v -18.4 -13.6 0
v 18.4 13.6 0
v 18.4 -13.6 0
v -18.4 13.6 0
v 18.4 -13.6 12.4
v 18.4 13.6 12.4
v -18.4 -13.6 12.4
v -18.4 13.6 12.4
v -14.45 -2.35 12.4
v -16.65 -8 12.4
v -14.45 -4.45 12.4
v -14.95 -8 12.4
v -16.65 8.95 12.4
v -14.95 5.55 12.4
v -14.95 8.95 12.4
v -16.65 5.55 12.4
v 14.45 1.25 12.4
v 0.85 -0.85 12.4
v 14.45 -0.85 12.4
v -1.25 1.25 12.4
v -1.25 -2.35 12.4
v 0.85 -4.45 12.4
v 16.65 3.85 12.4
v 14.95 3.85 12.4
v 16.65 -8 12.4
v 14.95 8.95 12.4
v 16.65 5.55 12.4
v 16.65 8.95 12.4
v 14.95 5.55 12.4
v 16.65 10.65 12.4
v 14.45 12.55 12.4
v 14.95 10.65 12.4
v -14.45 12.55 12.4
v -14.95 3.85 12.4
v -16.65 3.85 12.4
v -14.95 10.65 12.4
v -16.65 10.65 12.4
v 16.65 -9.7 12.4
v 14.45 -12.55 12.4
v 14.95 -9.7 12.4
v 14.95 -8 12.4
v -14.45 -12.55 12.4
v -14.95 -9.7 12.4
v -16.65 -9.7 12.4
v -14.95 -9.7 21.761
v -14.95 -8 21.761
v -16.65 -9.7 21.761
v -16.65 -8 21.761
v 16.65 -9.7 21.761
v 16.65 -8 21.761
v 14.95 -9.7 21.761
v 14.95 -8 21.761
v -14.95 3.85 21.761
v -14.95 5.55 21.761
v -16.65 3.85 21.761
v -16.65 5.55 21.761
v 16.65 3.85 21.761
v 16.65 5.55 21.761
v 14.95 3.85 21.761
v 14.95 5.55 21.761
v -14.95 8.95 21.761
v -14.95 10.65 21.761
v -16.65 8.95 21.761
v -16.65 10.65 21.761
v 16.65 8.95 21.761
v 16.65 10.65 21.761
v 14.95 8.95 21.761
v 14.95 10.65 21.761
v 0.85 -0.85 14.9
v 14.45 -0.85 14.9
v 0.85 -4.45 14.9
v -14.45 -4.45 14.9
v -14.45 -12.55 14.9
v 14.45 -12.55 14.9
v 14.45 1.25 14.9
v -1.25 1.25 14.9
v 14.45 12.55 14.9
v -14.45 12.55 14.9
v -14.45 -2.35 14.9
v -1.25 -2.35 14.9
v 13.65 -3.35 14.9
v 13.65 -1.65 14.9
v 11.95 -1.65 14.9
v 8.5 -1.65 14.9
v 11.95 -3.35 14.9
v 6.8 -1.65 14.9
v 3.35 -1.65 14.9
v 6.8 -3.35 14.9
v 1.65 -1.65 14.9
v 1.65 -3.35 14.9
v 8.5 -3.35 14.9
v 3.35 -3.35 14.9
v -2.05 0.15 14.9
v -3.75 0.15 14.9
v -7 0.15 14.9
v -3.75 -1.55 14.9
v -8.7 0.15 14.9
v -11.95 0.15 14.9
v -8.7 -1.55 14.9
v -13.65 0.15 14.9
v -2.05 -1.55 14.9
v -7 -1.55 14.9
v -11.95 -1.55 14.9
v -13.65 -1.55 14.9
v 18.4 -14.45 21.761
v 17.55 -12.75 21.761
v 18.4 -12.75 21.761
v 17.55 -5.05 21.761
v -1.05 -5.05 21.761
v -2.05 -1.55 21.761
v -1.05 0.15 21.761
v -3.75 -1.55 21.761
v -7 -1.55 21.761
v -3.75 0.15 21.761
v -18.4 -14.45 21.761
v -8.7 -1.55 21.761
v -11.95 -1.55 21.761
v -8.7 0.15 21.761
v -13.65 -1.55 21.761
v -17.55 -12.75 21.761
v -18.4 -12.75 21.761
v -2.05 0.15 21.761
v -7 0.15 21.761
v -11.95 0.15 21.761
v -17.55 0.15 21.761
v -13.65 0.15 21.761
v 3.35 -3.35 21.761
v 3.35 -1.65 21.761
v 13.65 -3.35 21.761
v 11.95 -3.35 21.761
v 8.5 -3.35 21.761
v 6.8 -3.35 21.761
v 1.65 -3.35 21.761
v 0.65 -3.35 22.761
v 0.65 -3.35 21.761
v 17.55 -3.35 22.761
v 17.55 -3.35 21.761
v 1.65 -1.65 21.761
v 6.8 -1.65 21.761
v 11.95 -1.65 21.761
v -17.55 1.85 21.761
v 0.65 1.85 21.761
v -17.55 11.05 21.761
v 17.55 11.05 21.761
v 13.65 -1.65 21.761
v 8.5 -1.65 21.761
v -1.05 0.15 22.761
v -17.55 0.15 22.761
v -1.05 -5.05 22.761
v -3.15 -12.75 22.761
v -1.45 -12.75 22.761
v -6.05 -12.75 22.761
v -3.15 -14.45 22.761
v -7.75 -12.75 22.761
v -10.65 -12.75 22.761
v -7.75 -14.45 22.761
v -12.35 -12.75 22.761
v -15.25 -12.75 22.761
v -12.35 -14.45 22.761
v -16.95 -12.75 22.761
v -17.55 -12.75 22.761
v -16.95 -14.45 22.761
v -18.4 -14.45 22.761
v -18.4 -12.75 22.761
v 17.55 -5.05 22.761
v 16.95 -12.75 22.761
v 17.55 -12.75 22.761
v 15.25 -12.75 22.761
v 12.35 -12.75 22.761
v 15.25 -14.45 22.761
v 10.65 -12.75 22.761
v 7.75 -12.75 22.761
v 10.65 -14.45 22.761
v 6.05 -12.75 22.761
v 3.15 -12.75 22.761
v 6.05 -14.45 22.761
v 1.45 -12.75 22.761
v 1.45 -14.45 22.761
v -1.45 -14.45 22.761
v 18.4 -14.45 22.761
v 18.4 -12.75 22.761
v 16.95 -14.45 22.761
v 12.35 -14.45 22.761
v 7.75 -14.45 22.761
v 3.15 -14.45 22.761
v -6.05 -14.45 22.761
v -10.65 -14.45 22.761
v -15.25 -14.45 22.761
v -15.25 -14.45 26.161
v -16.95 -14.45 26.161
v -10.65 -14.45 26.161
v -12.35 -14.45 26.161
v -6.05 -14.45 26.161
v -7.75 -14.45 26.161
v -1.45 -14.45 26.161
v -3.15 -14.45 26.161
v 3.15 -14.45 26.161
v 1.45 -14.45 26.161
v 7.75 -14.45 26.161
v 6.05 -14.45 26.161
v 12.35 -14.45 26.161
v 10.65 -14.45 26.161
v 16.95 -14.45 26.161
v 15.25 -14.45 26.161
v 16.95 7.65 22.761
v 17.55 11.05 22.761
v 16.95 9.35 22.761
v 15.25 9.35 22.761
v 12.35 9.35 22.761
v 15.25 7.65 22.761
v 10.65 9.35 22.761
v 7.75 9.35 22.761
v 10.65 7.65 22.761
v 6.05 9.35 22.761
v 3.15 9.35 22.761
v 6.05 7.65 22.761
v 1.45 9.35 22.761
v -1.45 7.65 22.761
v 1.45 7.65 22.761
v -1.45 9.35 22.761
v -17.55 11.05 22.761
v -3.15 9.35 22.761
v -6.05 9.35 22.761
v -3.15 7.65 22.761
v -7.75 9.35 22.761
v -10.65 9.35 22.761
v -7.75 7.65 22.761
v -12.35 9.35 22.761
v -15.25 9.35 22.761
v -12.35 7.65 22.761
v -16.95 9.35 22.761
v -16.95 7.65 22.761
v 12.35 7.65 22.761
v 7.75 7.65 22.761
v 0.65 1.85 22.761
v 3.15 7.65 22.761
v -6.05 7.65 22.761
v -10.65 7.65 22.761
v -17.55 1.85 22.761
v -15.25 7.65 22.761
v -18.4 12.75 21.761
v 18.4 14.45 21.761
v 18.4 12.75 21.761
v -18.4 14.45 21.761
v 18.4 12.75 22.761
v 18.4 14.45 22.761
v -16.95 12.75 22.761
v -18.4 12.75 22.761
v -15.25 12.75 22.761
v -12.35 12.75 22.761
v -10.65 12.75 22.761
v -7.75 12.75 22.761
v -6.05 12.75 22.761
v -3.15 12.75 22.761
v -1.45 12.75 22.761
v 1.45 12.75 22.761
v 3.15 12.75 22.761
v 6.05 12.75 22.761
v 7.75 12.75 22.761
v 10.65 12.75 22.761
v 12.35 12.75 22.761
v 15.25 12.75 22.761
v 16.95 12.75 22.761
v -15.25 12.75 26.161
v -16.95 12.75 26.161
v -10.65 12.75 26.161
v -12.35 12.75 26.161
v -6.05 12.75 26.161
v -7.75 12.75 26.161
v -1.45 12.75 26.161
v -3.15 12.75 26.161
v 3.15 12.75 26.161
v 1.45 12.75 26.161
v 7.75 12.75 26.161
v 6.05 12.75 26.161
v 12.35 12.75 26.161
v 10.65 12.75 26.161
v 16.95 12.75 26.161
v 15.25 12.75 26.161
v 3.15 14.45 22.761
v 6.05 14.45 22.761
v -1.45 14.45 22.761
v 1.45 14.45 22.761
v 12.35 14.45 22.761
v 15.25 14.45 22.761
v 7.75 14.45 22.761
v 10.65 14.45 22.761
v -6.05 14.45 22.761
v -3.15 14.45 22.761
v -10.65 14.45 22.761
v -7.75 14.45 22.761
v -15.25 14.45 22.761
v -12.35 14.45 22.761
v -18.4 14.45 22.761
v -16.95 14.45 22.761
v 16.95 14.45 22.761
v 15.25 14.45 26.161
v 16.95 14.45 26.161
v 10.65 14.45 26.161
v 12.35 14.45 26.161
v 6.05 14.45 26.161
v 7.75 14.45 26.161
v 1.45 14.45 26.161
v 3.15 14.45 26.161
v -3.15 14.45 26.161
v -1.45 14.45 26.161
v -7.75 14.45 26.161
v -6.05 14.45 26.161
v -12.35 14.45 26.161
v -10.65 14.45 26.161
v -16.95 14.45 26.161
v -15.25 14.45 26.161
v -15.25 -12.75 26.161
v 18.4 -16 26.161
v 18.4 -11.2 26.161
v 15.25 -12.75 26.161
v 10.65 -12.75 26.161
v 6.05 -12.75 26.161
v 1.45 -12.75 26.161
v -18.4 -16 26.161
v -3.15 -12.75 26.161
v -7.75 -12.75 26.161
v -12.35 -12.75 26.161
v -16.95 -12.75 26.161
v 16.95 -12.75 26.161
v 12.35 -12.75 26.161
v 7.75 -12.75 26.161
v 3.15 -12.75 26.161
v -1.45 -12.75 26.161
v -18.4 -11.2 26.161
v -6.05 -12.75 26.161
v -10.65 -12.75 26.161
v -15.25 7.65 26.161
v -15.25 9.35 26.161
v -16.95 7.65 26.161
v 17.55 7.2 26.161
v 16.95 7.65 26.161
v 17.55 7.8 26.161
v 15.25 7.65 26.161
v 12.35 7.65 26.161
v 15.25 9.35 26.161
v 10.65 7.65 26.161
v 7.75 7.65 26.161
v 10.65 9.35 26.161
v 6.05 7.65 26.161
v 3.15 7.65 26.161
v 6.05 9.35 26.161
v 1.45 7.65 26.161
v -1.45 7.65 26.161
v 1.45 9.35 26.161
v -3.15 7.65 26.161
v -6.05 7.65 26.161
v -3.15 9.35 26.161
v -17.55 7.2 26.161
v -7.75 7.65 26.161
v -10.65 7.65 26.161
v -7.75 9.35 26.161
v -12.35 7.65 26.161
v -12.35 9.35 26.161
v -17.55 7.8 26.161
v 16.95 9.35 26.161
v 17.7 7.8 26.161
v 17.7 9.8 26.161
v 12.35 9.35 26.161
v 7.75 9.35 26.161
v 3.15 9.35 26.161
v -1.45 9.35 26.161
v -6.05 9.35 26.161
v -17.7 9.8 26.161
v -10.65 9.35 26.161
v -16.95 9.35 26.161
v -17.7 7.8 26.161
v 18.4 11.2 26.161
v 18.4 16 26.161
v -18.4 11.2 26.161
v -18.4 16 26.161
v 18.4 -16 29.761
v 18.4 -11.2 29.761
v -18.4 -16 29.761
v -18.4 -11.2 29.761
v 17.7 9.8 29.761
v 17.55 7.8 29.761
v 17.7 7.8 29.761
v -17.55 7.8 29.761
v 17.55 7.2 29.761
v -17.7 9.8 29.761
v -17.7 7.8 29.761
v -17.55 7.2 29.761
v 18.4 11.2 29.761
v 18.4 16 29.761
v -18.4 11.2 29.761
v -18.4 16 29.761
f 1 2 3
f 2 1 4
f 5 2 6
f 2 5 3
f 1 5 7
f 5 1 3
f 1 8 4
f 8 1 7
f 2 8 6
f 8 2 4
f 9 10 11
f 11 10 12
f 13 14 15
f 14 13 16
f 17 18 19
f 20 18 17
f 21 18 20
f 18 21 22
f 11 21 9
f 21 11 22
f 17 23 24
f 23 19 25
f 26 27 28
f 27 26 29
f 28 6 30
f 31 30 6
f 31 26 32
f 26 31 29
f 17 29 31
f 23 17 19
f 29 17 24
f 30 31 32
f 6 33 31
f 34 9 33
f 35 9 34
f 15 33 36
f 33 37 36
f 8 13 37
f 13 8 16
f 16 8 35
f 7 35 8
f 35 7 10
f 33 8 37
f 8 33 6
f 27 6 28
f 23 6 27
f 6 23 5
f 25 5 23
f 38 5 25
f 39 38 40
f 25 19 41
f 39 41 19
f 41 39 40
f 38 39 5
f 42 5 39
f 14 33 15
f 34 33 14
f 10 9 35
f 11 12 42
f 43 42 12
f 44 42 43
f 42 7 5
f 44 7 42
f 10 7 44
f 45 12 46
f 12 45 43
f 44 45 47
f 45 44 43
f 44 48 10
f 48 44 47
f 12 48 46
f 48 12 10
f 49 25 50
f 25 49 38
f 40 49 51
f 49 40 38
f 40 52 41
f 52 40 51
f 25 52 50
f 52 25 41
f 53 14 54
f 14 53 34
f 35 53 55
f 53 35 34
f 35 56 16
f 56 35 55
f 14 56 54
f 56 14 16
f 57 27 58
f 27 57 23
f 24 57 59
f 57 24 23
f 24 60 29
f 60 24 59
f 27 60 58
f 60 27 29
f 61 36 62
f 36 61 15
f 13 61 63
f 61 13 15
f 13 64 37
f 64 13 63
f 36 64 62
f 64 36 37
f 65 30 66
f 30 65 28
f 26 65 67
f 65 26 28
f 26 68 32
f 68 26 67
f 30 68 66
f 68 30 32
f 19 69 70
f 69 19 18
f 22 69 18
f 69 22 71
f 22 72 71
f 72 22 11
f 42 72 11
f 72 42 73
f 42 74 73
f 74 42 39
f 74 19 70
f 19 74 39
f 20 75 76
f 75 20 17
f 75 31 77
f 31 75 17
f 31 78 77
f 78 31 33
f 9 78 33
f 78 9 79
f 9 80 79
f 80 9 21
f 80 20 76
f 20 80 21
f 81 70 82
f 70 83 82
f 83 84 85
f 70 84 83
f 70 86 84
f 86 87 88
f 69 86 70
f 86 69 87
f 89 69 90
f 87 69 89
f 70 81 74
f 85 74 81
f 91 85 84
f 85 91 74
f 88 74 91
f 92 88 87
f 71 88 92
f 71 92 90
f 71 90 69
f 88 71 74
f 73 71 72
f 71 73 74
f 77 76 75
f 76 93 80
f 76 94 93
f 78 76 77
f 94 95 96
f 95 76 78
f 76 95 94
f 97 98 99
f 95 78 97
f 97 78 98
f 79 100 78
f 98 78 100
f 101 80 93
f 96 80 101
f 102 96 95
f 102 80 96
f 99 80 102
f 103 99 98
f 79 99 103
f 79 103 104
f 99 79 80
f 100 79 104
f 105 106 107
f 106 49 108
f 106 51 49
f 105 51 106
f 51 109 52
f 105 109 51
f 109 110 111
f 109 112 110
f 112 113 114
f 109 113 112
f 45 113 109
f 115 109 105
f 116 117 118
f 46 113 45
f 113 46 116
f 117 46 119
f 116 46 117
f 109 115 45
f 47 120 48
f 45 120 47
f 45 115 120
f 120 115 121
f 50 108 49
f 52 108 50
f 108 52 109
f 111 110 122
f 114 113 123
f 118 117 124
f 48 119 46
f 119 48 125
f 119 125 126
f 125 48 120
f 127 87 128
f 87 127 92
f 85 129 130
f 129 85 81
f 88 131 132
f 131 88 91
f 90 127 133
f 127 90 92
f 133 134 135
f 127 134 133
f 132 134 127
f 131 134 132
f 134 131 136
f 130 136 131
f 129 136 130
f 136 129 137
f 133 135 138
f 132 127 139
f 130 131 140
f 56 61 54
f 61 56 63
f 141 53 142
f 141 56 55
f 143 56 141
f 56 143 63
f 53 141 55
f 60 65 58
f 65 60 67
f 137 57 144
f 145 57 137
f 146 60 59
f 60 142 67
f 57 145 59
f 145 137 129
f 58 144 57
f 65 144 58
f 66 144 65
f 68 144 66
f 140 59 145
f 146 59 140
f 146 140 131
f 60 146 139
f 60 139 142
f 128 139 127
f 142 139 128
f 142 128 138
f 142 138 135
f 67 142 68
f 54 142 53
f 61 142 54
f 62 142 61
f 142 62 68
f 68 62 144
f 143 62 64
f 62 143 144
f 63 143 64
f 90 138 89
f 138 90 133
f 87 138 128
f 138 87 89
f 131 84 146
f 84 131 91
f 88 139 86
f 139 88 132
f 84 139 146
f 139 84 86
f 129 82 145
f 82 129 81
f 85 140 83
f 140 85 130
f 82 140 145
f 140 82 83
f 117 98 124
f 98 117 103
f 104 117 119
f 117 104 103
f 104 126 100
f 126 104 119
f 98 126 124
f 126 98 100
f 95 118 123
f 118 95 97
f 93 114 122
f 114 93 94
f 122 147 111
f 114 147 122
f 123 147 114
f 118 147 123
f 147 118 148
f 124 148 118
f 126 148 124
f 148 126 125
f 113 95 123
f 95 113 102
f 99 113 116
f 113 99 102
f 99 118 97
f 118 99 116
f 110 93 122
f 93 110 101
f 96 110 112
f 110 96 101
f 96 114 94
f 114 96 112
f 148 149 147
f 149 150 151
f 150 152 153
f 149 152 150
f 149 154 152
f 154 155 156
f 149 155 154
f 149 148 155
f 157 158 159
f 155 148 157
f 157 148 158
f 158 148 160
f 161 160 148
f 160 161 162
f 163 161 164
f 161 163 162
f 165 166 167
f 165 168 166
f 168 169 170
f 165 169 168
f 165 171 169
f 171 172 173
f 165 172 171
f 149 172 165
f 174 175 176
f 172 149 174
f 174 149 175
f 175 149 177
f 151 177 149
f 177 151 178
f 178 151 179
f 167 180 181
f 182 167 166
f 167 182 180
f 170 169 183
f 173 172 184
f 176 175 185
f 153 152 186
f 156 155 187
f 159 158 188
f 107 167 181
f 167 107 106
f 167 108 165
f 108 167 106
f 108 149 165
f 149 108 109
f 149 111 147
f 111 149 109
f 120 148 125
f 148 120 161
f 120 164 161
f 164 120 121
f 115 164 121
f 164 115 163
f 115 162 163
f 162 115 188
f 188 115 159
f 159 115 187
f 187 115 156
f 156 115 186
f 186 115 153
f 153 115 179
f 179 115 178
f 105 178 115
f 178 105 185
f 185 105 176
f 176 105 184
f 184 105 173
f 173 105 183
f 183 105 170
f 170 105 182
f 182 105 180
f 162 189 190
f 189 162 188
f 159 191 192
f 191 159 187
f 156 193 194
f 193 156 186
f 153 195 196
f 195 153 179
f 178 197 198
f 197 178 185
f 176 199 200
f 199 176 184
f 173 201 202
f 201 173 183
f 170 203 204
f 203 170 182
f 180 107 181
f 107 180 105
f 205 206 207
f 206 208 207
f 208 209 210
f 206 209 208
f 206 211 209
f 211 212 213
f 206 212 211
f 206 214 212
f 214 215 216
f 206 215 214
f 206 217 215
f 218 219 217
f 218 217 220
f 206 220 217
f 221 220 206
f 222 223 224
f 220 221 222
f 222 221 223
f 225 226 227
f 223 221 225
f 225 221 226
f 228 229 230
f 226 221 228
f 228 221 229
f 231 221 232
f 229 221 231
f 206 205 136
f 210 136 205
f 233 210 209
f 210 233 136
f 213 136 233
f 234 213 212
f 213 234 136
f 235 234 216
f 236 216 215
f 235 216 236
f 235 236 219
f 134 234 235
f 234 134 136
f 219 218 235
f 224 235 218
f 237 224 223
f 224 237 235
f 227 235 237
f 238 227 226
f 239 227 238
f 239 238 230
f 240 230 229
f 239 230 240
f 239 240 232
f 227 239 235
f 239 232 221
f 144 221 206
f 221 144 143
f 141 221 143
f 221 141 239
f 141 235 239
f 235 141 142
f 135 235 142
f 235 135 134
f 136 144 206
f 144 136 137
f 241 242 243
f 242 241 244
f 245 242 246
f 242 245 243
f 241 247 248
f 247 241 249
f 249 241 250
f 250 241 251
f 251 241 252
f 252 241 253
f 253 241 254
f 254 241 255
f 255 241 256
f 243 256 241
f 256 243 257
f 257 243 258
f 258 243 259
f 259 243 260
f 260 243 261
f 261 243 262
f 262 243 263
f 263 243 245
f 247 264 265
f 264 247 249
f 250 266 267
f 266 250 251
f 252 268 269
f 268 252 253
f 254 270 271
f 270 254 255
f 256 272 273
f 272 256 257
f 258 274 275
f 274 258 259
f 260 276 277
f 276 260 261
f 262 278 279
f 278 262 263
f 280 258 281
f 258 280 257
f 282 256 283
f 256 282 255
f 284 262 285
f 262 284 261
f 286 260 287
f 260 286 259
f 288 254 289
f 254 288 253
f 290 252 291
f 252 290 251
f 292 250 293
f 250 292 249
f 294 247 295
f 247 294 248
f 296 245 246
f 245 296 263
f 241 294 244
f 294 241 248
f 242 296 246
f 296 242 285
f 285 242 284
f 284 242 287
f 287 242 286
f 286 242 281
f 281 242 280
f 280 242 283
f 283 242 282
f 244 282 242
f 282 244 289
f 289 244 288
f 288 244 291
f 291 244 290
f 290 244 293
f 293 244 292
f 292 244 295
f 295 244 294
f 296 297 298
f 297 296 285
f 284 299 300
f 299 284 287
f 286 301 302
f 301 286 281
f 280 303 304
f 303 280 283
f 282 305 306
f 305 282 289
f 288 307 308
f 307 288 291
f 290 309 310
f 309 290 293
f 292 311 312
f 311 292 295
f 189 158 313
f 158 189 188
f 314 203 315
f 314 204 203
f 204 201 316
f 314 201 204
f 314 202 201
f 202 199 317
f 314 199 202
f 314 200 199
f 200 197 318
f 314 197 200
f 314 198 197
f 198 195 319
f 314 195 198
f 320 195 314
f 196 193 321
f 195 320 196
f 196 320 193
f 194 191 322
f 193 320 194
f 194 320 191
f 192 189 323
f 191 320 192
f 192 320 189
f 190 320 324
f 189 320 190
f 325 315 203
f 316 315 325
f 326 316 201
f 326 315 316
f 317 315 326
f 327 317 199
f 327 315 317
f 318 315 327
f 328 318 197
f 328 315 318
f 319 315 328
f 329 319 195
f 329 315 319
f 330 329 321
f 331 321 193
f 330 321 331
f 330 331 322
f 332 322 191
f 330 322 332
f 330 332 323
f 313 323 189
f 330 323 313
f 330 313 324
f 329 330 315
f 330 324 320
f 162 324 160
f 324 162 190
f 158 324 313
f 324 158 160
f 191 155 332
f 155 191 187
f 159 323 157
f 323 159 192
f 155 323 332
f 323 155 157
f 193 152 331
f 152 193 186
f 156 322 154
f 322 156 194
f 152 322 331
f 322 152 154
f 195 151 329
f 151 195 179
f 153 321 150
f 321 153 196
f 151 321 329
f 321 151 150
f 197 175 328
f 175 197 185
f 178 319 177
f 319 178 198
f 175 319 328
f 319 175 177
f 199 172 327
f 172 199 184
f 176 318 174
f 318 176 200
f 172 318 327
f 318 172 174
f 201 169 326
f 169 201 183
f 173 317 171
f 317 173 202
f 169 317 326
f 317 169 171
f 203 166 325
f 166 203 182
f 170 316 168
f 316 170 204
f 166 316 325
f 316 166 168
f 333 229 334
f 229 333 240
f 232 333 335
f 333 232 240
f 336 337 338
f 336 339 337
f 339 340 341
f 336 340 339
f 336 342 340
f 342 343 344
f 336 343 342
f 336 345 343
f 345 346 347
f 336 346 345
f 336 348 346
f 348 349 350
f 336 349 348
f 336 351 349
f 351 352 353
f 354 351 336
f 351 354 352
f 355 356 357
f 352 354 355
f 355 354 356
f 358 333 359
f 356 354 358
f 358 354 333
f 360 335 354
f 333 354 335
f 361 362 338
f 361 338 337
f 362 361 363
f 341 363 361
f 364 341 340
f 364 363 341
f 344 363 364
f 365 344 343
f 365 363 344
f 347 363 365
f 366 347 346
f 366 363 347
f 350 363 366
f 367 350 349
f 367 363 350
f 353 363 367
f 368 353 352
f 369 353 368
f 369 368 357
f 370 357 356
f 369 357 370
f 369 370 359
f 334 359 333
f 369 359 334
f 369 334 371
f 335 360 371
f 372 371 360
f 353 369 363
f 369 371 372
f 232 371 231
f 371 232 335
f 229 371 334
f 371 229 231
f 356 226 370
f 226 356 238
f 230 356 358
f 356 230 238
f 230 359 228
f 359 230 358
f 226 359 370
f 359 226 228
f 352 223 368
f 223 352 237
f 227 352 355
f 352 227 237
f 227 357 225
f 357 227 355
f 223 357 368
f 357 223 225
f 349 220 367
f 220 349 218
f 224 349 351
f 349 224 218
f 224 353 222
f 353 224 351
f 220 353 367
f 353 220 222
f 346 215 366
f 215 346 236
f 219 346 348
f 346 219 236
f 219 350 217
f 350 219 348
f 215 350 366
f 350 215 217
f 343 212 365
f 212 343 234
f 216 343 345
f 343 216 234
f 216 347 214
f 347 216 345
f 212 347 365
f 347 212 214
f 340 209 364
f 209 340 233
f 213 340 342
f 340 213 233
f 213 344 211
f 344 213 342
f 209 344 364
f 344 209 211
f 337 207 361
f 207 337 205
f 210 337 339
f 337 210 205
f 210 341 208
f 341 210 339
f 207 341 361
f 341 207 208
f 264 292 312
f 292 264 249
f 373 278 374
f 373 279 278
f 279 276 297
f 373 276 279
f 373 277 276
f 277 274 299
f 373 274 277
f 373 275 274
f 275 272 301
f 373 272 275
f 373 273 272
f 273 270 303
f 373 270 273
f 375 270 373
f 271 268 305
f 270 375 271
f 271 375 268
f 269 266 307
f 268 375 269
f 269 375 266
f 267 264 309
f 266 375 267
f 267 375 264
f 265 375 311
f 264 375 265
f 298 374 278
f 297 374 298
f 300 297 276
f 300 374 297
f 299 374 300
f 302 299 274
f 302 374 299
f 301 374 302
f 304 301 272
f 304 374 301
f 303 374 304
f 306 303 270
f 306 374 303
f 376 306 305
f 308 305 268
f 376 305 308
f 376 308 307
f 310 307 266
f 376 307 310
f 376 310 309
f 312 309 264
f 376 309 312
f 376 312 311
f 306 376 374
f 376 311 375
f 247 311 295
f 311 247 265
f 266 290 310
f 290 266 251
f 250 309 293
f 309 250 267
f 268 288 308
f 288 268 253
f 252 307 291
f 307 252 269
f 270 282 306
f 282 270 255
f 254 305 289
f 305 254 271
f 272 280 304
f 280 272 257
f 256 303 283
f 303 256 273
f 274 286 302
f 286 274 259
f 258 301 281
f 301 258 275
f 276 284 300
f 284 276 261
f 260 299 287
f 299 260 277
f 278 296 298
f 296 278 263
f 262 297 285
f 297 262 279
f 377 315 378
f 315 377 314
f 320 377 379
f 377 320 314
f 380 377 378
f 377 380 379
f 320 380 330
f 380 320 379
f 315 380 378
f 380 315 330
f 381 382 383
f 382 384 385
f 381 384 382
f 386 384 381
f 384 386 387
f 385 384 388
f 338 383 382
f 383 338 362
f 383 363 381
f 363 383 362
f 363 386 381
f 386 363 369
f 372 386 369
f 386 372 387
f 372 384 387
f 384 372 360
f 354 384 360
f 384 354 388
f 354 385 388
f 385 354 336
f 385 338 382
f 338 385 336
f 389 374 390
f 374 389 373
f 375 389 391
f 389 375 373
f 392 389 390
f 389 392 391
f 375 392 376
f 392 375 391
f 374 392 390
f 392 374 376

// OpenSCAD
// Generated by SolidPython 0.4.2 on 2020-09-29 23:21:06
//!OpenSCAD

scale(v = 0.0100000000) {
	translate(v = [-1840, -1360, 0]) {
		union() {
			color(c = [0.4000000000, 0.4000000000, 0.4000000000]) {
				translate(v = [0, 0, 0]) {
					linear_extrude(height = 1000.0000000000) {
						polygon(paths = [[0, 1, 2, 3]], points = [[0, 0], [0, 2720], [3680, 2720], [3680, 0]]);
					}
				}
			}
			color(c = [0.2000000000, 0.6000000000, 0.2000000000]) {
				translate(v = [0, 0, 1000.0000000000]) {
					linear_extrude(height = 120.0000000000) {
						polygon(paths = [[0, 1, 2, 3]], points = [[0, 1305], [0, 2720], [3680, 2720], [3680, 1305]]);
					}
				}
			}
			color(c = [0.4000000000, 0.4000000000, 0.4000000000]) {
				translate(v = [0, 0, 1000.0000000000]) {
					linear_extrude(height = 120.0000000000) {
						polygon(paths = [[0, 1, 2, 3]], points = [[0, 0], [0, 1305], [3680, 1305], [3680, 0]]);
					}
				}
			}
			color(c = [0.9000000000, 0.6000000000, 0.6000000000]) {
				translate(v = [0, 0, 1120.0000000000]) {
					linear_extrude(height = 120.0000000000) {
						polygon(paths = [[0, 1, 2, 3]], points = [[135, 1615], [135, 2485], [395, 2485], [395, 1615]]);
					}
				}
			}
			color(c = [0.9000000000, 0.6000000000, 0.6000000000]) {
				translate(v = [0, 0, 1120.0000000000]) {
					linear_extrude(height = 120.0000000000) {
						polygon(paths = [[0, 1, 2, 3]], points = [[3285, 1615], [3285, 2485], [3545, 2485], [3545, 1615]]);
					}
				}
			}
			color(c = [0.9000000000, 0.6000000000, 0.9000000000]) {
				translate(v = [0, 0, 1120.0000000000]) {
					linear_extrude(height = 120.0000000000) {
						polygon(paths = [[0, 1, 2, 3]], points = [[135, 235], [135, 785], [395, 785], [395, 235]]);
					}
				}
			}
			color(c = [0.9000000000, 0.6000000000, 0.9000000000]) {
				translate(v = [0, 0, 1120.0000000000]) {
					linear_extrude(height = 120.0000000000) {
						polygon(paths = [[0, 1, 2, 3]], points = [[3285, 235], [3285, 785], [3545, 785], [3545, 235]]);
					}
				}
			}
			color(c = [0.2000000000, 0.6000000000, 0.2000000000]) {
				translate(v = [0, 0, 1120.0000000000]) {
					linear_extrude(height = 120.0000000000) {
						difference() {
							polygon(paths = [[0, 1, 2, 3]], points = [[0, 1305], [0, 2720], [3680, 2720], [3680, 1305]]);
							polygon(paths = [[0, 1, 2, 3]], points = [[135, 1615], [395, 1615], [395, 2485], [135, 2485]]);
							polygon(paths = [[0, 1, 2, 3]], points = [[3285, 1615], [3545, 1615], [3545, 2485], [3285, 2485]]);
						}
					}
				}
			}
			color(c = [0.4000000000, 0.4000000000, 0.4000000000]) {
				translate(v = [0, 0, 1120.0000000000]) {
					linear_extrude(height = 120.0000000000) {
						difference() {
							polygon(paths = [[0, 1, 2, 3]], points = [[0, 0], [0, 1305], [3680, 1305], [3680, 0]]);
							polygon(paths = [[0, 1, 2, 3]], points = [[135, 235], [395, 235], [395, 785], [135, 785]]);
							polygon(paths = [[0, 1, 2, 3]], points = [[3285, 235], [3545, 235], [3545, 785], [3285, 785]]);
						}
					}
				}
			}
			color(c = [0.1000000000, 0.1000000000, 0.1000000000]) {
				translate(v = [0, 0, 1240.0000000000]) {
					linear_extrude(height = 70.0000000000) {
						polygon(paths = [[0, 1, 2, 3]], points = [[175, 390], [175, 560], [345, 560], [345, 390]]);
					}
				}
			}
			color(c = [0.1000000000, 0.1000000000, 0.1000000000]) {
				translate(v = [0, 0, 1240.0000000000]) {
					linear_extrude(height = 70.0000000000) {
						polygon(paths = [[0, 1, 2, 3]], points = [[3335, 390], [3335, 560], [3505, 560], [3505, 390]]);
					}
				}
			}
			color(c = [0.1000000000, 0.1000000000, 0.1000000000]) {
				translate(v = [0, 0, 1240.0000000000]) {
					linear_extrude(height = 70.0000000000) {
						polygon(paths = [[0, 1, 2, 3]], points = [[175, 1745], [175, 1915], [345, 1915], [345, 1745]]);
					}
				}
			}
			color(c = [0.1000000000, 0.1000000000, 0.1000000000]) {
				translate(v = [0, 0, 1240.0000000000]) {
					linear_extrude(height = 70.0000000000) {
						polygon(paths = [[0, 1, 2, 3]], points = [[3335, 1745], [3335, 1915], [3505, 1915], [3505, 1745]]);
					}
				}
			}
			color(c = [0.1000000000, 0.1000000000, 0.1000000000]) {
				translate(v = [0, 0, 1240.0000000000]) {
					linear_extrude(height = 70.0000000000) {
						polygon(paths = [[0, 1, 2, 3]], points = [[175, 2255], [175, 2425], [345, 2425], [345, 2255]]);
					}
				}
			}
			color(c = [0.1000000000, 0.1000000000, 0.1000000000]) {
				translate(v = [0, 0, 1240.0000000000]) {
					linear_extrude(height = 70.0000000000) {
						polygon(paths = [[0, 1, 2, 3]], points = [[3335, 2255], [3335, 2425], [3505, 2425], [3505, 2255]]);
					}
				}
			}
			color(c = [1.0000000000, 1.0000000000, 1.0000000000]) {
				translate(v = [0, 0, 1240.0000000000]) {
					linear_extrude(height = 70.0000000000) {
						polygon(paths = [[0, 1, 2, 3, 4, 5]], points = [[395, 105], [395, 915], [1925, 915], [1925, 1275], [3285, 1275], [3285, 105]]);
					}
				}
			}
			color(c = [1.0000000000, 1.0000000000, 1.0000000000]) {
				translate(v = [0, 0, 1240.0000000000]) {
					linear_extrude(height = 70.0000000000) {
						polygon(paths = [[0, 1, 2, 3, 4, 5]], points = [[395, 1125], [395, 2615], [3285, 2615], [3285, 1485], [1715, 1485], [1715, 1125]]);
					}
				}
			}
			color(c = [0.1000000000, 0.1000000000, 0.1000000000]) {
				translate(v = [0, 0, 1310.0000000000]) {
					linear_extrude(height = 180.0000000000) {
						polygon(paths = [[0, 1, 2, 3]], points = [[175, 390], [175, 560], [345, 560], [345, 390]]);
					}
				}
			}
			color(c = [0.1000000000, 0.1000000000, 0.1000000000]) {
				translate(v = [0, 0, 1310.0000000000]) {
					linear_extrude(height = 180.0000000000) {
						polygon(paths = [[0, 1, 2, 3]], points = [[3335, 390], [3335, 560], [3505, 560], [3505, 390]]);
					}
				}
			}
			color(c = [0.1000000000, 0.1000000000, 0.1000000000]) {
				translate(v = [0, 0, 1310.0000000000]) {
					linear_extrude(height = 180.0000000000) {
						polygon(paths = [[0, 1, 2, 3]], points = [[175, 1745], [175, 1915], [345, 1915], [345, 1745]]);
					}
				}
			}
			color(c = [0.1000000000, 0.1000000000, 0.1000000000]) {
				translate(v = [0, 0, 1310.0000000000]) {
					linear_extrude(height = 180.0000000000) {
						polygon(paths = [[0, 1, 2, 3]], points = [[3335, 1745], [3335, 1915], [3505, 1915], [3505, 1745]]);
					}
				}
			}
			color(c = [0.1000000000, 0.1000000000, 0.1000000000]) {
				translate(v = [0, 0, 1310.0000000000]) {
					linear_extrude(height = 180.0000000000) {
						polygon(paths = [[0, 1, 2, 3]], points = [[175, 2255], [175, 2425], [345, 2425], [345, 2255]]);
					}
				}
			}
			color(c = [0.1000000000, 0.1000000000, 0.1000000000]) {
				translate(v = [0, 0, 1310.0000000000]) {
					linear_extrude(height = 180.0000000000) {
						polygon(paths = [[0, 1, 2, 3]], points = [[3335, 2255], [3335, 2425], [3505, 2425], [3505, 2255]]);
					}
				}
			}
			color(c = [0.7000000000, 0, 0]) {
				translate(v = [0, 0, 1310.0000000000]) {
					linear_extrude(height = 180.0000000000) {
						polygon(paths = [[0, 1, 2, 3, 4, 5]], points = [[395, 105], [395, 915], [1925, 915], [1925, 1275], [3285, 1275], [3285, 105]]);
					}
				}
			}
			color(c = [0.7000000000, 0, 0]) {
				translate(v = [0, 0, 1310.0000000000]) {
					linear_extrude(height = 180.0000000000) {
						polygon(paths = [[0, 1, 2, 3, 4, 5]], points = [[395, 1125], [395, 2615], [3285, 2615], [3285, 1485], [1715, 1485], [1715, 1125]]);
					}
				}
			}
			color(c = [0.1000000000, 0.1000000000, 0.1000000000]) {
				translate(v = [0, 0, 1490.0000000000]) {
					linear_extrude(height = 686.1000000000) {
						polygon(paths = [[0, 1, 2, 3]], points = [[175, 390], [175, 560], [345, 560], [345, 390]]);
					}
				}
			}
			color(c = [0.1000000000, 0.1000000000, 0.1000000000]) {
				translate(v = [0, 0, 1490.0000000000]) {
					linear_extrude(height = 686.1000000000) {
						polygon(paths = [[0, 1, 2, 3]], points = [[3335, 390], [3335, 560], [3505, 560], [3505, 390]]);
					}
				}
			}
			color(c = [0.1000000000, 0.1000000000, 0.1000000000]) {
				translate(v = [0, 0, 1490.0000000000]) {
					linear_extrude(height = 686.1000000000) {
						polygon(paths = [[0, 1, 2, 3]], points = [[2005, 1025], [2005, 1195], [2175, 1195], [2175, 1025]]);
					}
				}
			}
			color(c = [0.1000000000, 0.1000000000, 0.1000000000]) {
				translate(v = [0, 0, 1490.0000000000]) {
					linear_extrude(height = 686.1000000000) {
						polygon(paths = [[0, 1, 2, 3]], points = [[2520, 1025], [2520, 1195], [2690, 1195], [2690, 1025]]);
					}
				}
			}
			color(c = [0.1000000000, 0.1000000000, 0.1000000000]) {
				translate(v = [0, 0, 1490.0000000000]) {
					linear_extrude(height = 686.1000000000) {
						polygon(paths = [[0, 1, 2, 3]], points = [[3035, 1025], [3035, 1195], [3205, 1195], [3205, 1025]]);
					}
				}
			}
			color(c = [0.1000000000, 0.1000000000, 0.1000000000]) {
				translate(v = [0, 0, 1490.0000000000]) {
					linear_extrude(height = 686.1000000000) {
						polygon(paths = [[0, 1, 2, 3]], points = [[475, 1205], [475, 1375], [645, 1375], [645, 1205]]);
					}
				}
			}
			color(c = [0.1000000000, 0.1000000000, 0.1000000000]) {
				translate(v = [0, 0, 1490.0000000000]) {
					linear_extrude(height = 686.1000000000) {
						polygon(paths = [[0, 1, 2, 3]], points = [[970, 1205], [970, 1375], [1140, 1375], [1140, 1205]]);
					}
				}
			}
			color(c = [0.1000000000, 0.1000000000, 0.1000000000]) {
				translate(v = [0, 0, 1490.0000000000]) {
					linear_extrude(height = 686.1000000000) {
						polygon(paths = [[0, 1, 2, 3]], points = [[1465, 1205], [1465, 1375], [1635, 1375], [1635, 1205]]);
					}
				}
			}
			color(c = [0.1000000000, 0.1000000000, 0.1000000000]) {
				translate(v = [0, 0, 1490.0000000000]) {
					linear_extrude(height = 686.1000000000) {
						polygon(paths = [[0, 1, 2, 3]], points = [[175, 1745], [175, 1915], [345, 1915], [345, 1745]]);
					}
				}
			}
			color(c = [0.1000000000, 0.1000000000, 0.1000000000]) {
				translate(v = [0, 0, 1490.0000000000]) {
					linear_extrude(height = 686.1000000000) {
						polygon(paths = [[0, 1, 2, 3]], points = [[3335, 1745], [3335, 1915], [3505, 1915], [3505, 1745]]);
					}
				}
			}
			color(c = [0.1000000000, 0.1000000000, 0.1000000000]) {
				translate(v = [0, 0, 1490.0000000000]) {
					linear_extrude(height = 686.1000000000) {
						polygon(paths = [[0, 1, 2, 3]], points = [[175, 2255], [175, 2425], [345, 2425], [345, 2255]]);
					}
				}
			}
			color(c = [0.1000000000, 0.1000000000, 0.1000000000]) {
				translate(v = [0, 0, 1490.0000000000]) {
					linear_extrude(height = 686.1000000000) {
						polygon(paths = [[0, 1, 2, 3]], points = [[3335, 2255], [3335, 2425], [3505, 2425], [3505, 2255]]);
					}
				}
			}
			color(c = [0.9000000000, 0.6000000000, 0.6000000000]) {
				translate(v = [0, 0, 2176.1000000000]) {
					linear_extrude(height = 100.0000000000) {
						polygon(paths = [[0, 1, 2, 3, 4, 5, 6, 7, 8, 9]], points = [[0, -85], [0, 85], [85, 85], [85, 1375], [1735, 1375], [1735, 855], [3595, 855], [3595, 85], [3680, 85], [3680, -85]]);
					}
				}
			}
			color(c = [0.9000000000, 0.6000000000, 0.6000000000]) {
				translate(v = [0, 0, 2176.1000000000]) {
					linear_extrude(height = 100.0000000000) {
						polygon(paths = [[0, 1, 2, 3, 4, 5]], points = [[1905, 1025], [1905, 1545], [85, 1545], [85, 2465], [3595, 2465], [3595, 1025]]);
					}
				}
			}
			color(c = [0.9000000000, 0.6000000000, 0.6000000000]) {
				translate(v = [0, 0, 2176.1000000000]) {
					linear_extrude(height = 100.0000000000) {
						polygon(paths = [[0, 1, 2, 3]], points = [[0, 2635], [0, 2805], [3680, 2805], [3680, 2635]]);
					}
				}
			}
			color(c = [0.5000000000, 0.5000000000, 0.5000000000]) {
				translate(v = [0, 0, 2276.1000000000]) {
					linear_extrude(height = 340.0000000000) {
						polygon(paths = [[0, 1, 2, 3]], points = [[145, -85], [145, 85], [315, 85], [315, -85]]);
					}
				}
			}
			color(c = [0.5000000000, 0.5000000000, 0.5000000000]) {
				translate(v = [0, 0, 2276.1000000000]) {
					linear_extrude(height = 340.0000000000) {
						polygon(paths = [[0, 1, 2, 3]], points = [[605, -85], [605, 85], [775, 85], [775, -85]]);
					}
				}
			}
			color(c = [0.5000000000, 0.5000000000, 0.5000000000]) {
				translate(v = [0, 0, 2276.1000000000]) {
					linear_extrude(height = 340.0000000000) {
						polygon(paths = [[0, 1, 2, 3]], points = [[1065, -85], [1065, 85], [1235, 85], [1235, -85]]);
					}
				}
			}
			color(c = [0.5000000000, 0.5000000000, 0.5000000000]) {
				translate(v = [0, 0, 2276.1000000000]) {
					linear_extrude(height = 340.0000000000) {
						polygon(paths = [[0, 1, 2, 3]], points = [[1525, -85], [1525, 85], [1695, 85], [1695, -85]]);
					}
				}
			}
			color(c = [0.5000000000, 0.5000000000, 0.5000000000]) {
				translate(v = [0, 0, 2276.1000000000]) {
					linear_extrude(height = 340.0000000000) {
						polygon(paths = [[0, 1, 2, 3]], points = [[1985, -85], [1985, 85], [2155, 85], [2155, -85]]);
					}
				}
			}
			color(c = [0.5000000000, 0.5000000000, 0.5000000000]) {
				translate(v = [0, 0, 2276.1000000000]) {
					linear_extrude(height = 340.0000000000) {
						polygon(paths = [[0, 1, 2, 3]], points = [[2445, -85], [2445, 85], [2615, 85], [2615, -85]]);
					}
				}
			}
			color(c = [0.5000000000, 0.5000000000, 0.5000000000]) {
				translate(v = [0, 0, 2276.1000000000]) {
					linear_extrude(height = 340.0000000000) {
						polygon(paths = [[0, 1, 2, 3]], points = [[2905, -85], [2905, 85], [3075, 85], [3075, -85]]);
					}
				}
			}
			color(c = [0.5000000000, 0.5000000000, 0.5000000000]) {
				translate(v = [0, 0, 2276.1000000000]) {
					linear_extrude(height = 340.0000000000) {
						polygon(paths = [[0, 1, 2, 3]], points = [[3365, -85], [3365, 85], [3535, 85], [3535, -85]]);
					}
				}
			}
			color(c = [0.5000000000, 0.5000000000, 0.5000000000]) {
				translate(v = [0, 0, 2276.1000000000]) {
					linear_extrude(height = 340.0000000000) {
						polygon(paths = [[0, 1, 2, 3]], points = [[145, 2125], [145, 2295], [315, 2295], [315, 2125]]);
					}
				}
			}
			color(c = [0.5000000000, 0.5000000000, 0.5000000000]) {
				translate(v = [0, 0, 2276.1000000000]) {
					linear_extrude(height = 340.0000000000) {
						polygon(paths = [[0, 1, 2, 3]], points = [[605, 2125], [605, 2295], [775, 2295], [775, 2125]]);
					}
				}
			}
			color(c = [0.5000000000, 0.5000000000, 0.5000000000]) {
				translate(v = [0, 0, 2276.1000000000]) {
					linear_extrude(height = 340.0000000000) {
						polygon(paths = [[0, 1, 2, 3]], points = [[1065, 2125], [1065, 2295], [1235, 2295], [1235, 2125]]);
					}
				}
			}
			color(c = [0.5000000000, 0.5000000000, 0.5000000000]) {
				translate(v = [0, 0, 2276.1000000000]) {
					linear_extrude(height = 340.0000000000) {
						polygon(paths = [[0, 1, 2, 3]], points = [[1525, 2125], [1525, 2295], [1695, 2295], [1695, 2125]]);
					}
				}
			}
			color(c = [0.5000000000, 0.5000000000, 0.5000000000]) {
				translate(v = [0, 0, 2276.1000000000]) {
					linear_extrude(height = 340.0000000000) {
						polygon(paths = [[0, 1, 2, 3]], points = [[1985, 2125], [1985, 2295], [2155, 2295], [2155, 2125]]);
					}
				}
			}
			color(c = [0.5000000000, 0.5000000000, 0.5000000000]) {
				translate(v = [0, 0, 2276.1000000000]) {
					linear_extrude(height = 340.0000000000) {
						polygon(paths = [[0, 1, 2, 3]], points = [[2445, 2125], [2445, 2295], [2615, 2295], [2615, 2125]]);
					}
				}
			}
			color(c = [0.5000000000, 0.5000000000, 0.5000000000]) {
				translate(v = [0, 0, 2276.1000000000]) {
					linear_extrude(height = 340.0000000000) {
						polygon(paths = [[0, 1, 2, 3]], points = [[2905, 2125], [2905, 2295], [3075, 2295], [3075, 2125]]);
					}
				}
			}
			color(c = [0.5000000000, 0.5000000000, 0.5000000000]) {
				translate(v = [0, 0, 2276.1000000000]) {
					linear_extrude(height = 340.0000000000) {
						polygon(paths = [[0, 1, 2, 3]], points = [[3365, 2125], [3365, 2295], [3535, 2295], [3535, 2125]]);
					}
				}
			}
			color(c = [0.5000000000, 0.5000000000, 0.5000000000]) {
				translate(v = [0, 0, 2276.1000000000]) {
					linear_extrude(height = 340.0000000000) {
						polygon(paths = [[0, 1, 2, 3]], points = [[145, 2635], [145, 2805], [315, 2805], [315, 2635]]);
					}
				}
			}
			color(c = [0.5000000000, 0.5000000000, 0.5000000000]) {
				translate(v = [0, 0, 2276.1000000000]) {
					linear_extrude(height = 340.0000000000) {
						polygon(paths = [[0, 1, 2, 3]], points = [[605, 2635], [605, 2805], [775, 2805], [775, 2635]]);
					}
				}
			}
			color(c = [0.5000000000, 0.5000000000, 0.5000000000]) {
				translate(v = [0, 0, 2276.1000000000]) {
					linear_extrude(height = 340.0000000000) {
						polygon(paths = [[0, 1, 2, 3]], points = [[1065, 2635], [1065, 2805], [1235, 2805], [1235, 2635]]);
					}
				}
			}
			color(c = [0.5000000000, 0.5000000000, 0.5000000000]) {
				translate(v = [0, 0, 2276.1000000000]) {
					linear_extrude(height = 340.0000000000) {
						polygon(paths = [[0, 1, 2, 3]], points = [[1525, 2635], [1525, 2805], [1695, 2805], [1695, 2635]]);
					}
				}
			}
			color(c = [0.5000000000, 0.5000000000, 0.5000000000]) {
				translate(v = [0, 0, 2276.1000000000]) {
					linear_extrude(height = 340.0000000000) {
						polygon(paths = [[0, 1, 2, 3]], points = [[1985, 2635], [1985, 2805], [2155, 2805], [2155, 2635]]);
					}
				}
			}
			color(c = [0.5000000000, 0.5000000000, 0.5000000000]) {
				translate(v = [0, 0, 2276.1000000000]) {
					linear_extrude(height = 340.0000000000) {
						polygon(paths = [[0, 1, 2, 3]], points = [[2445, 2635], [2445, 2805], [2615, 2805], [2615, 2635]]);
					}
				}
			}
			color(c = [0.5000000000, 0.5000000000, 0.5000000000]) {
				translate(v = [0, 0, 2276.1000000000]) {
					linear_extrude(height = 340.0000000000) {
						polygon(paths = [[0, 1, 2, 3]], points = [[2905, 2635], [2905, 2805], [3075, 2805], [3075, 2635]]);
					}
				}
			}
			color(c = [0.5000000000, 0.5000000000, 0.5000000000]) {
				translate(v = [0, 0, 2276.1000000000]) {
					linear_extrude(height = 340.0000000000) {
						polygon(paths = [[0, 1, 2, 3]], points = [[3365, 2635], [3365, 2805], [3535, 2805], [3535, 2635]]);
					}
				}
			}
			color(c = [0.3000000000, 0.3000000000, 1]) {
				translate(v = [0, 0, 2616.1000000000]) {
					linear_extrude(height = 360.0000000000) {
						polygon(paths = [[0, 1, 2, 3]], points = [[0, -240], [0, 240], [3680, 240], [3680, -240]]);
					}
				}
			}
			color(c = [0.3000000000, 0.3000000000, 1]) {
				translate(v = [0, 0, 2616.1000000000]) {
					linear_extrude(height = 360.0000000000) {
						polygon(paths = [[0, 1, 2, 3, 4, 5, 6, 7]], points = [[85, 2080], [85, 2140], [70, 2140], [70, 2340], [3610, 2340], [3610, 2140], [3595, 2140], [3595, 2080]]);
					}
				}
			}
			color(c = [0.3000000000, 0.3000000000, 1]) {
				translate(v = [0, 0, 2616.1000000000]) {
					linear_extrude(height = 360.0000000000) {
						polygon(paths = [[0, 1, 2, 3]], points = [[0, 2480], [0, 2960], [3680, 2960], [3680, 2480]]);
					}
				}
			}
		}
	}
}
